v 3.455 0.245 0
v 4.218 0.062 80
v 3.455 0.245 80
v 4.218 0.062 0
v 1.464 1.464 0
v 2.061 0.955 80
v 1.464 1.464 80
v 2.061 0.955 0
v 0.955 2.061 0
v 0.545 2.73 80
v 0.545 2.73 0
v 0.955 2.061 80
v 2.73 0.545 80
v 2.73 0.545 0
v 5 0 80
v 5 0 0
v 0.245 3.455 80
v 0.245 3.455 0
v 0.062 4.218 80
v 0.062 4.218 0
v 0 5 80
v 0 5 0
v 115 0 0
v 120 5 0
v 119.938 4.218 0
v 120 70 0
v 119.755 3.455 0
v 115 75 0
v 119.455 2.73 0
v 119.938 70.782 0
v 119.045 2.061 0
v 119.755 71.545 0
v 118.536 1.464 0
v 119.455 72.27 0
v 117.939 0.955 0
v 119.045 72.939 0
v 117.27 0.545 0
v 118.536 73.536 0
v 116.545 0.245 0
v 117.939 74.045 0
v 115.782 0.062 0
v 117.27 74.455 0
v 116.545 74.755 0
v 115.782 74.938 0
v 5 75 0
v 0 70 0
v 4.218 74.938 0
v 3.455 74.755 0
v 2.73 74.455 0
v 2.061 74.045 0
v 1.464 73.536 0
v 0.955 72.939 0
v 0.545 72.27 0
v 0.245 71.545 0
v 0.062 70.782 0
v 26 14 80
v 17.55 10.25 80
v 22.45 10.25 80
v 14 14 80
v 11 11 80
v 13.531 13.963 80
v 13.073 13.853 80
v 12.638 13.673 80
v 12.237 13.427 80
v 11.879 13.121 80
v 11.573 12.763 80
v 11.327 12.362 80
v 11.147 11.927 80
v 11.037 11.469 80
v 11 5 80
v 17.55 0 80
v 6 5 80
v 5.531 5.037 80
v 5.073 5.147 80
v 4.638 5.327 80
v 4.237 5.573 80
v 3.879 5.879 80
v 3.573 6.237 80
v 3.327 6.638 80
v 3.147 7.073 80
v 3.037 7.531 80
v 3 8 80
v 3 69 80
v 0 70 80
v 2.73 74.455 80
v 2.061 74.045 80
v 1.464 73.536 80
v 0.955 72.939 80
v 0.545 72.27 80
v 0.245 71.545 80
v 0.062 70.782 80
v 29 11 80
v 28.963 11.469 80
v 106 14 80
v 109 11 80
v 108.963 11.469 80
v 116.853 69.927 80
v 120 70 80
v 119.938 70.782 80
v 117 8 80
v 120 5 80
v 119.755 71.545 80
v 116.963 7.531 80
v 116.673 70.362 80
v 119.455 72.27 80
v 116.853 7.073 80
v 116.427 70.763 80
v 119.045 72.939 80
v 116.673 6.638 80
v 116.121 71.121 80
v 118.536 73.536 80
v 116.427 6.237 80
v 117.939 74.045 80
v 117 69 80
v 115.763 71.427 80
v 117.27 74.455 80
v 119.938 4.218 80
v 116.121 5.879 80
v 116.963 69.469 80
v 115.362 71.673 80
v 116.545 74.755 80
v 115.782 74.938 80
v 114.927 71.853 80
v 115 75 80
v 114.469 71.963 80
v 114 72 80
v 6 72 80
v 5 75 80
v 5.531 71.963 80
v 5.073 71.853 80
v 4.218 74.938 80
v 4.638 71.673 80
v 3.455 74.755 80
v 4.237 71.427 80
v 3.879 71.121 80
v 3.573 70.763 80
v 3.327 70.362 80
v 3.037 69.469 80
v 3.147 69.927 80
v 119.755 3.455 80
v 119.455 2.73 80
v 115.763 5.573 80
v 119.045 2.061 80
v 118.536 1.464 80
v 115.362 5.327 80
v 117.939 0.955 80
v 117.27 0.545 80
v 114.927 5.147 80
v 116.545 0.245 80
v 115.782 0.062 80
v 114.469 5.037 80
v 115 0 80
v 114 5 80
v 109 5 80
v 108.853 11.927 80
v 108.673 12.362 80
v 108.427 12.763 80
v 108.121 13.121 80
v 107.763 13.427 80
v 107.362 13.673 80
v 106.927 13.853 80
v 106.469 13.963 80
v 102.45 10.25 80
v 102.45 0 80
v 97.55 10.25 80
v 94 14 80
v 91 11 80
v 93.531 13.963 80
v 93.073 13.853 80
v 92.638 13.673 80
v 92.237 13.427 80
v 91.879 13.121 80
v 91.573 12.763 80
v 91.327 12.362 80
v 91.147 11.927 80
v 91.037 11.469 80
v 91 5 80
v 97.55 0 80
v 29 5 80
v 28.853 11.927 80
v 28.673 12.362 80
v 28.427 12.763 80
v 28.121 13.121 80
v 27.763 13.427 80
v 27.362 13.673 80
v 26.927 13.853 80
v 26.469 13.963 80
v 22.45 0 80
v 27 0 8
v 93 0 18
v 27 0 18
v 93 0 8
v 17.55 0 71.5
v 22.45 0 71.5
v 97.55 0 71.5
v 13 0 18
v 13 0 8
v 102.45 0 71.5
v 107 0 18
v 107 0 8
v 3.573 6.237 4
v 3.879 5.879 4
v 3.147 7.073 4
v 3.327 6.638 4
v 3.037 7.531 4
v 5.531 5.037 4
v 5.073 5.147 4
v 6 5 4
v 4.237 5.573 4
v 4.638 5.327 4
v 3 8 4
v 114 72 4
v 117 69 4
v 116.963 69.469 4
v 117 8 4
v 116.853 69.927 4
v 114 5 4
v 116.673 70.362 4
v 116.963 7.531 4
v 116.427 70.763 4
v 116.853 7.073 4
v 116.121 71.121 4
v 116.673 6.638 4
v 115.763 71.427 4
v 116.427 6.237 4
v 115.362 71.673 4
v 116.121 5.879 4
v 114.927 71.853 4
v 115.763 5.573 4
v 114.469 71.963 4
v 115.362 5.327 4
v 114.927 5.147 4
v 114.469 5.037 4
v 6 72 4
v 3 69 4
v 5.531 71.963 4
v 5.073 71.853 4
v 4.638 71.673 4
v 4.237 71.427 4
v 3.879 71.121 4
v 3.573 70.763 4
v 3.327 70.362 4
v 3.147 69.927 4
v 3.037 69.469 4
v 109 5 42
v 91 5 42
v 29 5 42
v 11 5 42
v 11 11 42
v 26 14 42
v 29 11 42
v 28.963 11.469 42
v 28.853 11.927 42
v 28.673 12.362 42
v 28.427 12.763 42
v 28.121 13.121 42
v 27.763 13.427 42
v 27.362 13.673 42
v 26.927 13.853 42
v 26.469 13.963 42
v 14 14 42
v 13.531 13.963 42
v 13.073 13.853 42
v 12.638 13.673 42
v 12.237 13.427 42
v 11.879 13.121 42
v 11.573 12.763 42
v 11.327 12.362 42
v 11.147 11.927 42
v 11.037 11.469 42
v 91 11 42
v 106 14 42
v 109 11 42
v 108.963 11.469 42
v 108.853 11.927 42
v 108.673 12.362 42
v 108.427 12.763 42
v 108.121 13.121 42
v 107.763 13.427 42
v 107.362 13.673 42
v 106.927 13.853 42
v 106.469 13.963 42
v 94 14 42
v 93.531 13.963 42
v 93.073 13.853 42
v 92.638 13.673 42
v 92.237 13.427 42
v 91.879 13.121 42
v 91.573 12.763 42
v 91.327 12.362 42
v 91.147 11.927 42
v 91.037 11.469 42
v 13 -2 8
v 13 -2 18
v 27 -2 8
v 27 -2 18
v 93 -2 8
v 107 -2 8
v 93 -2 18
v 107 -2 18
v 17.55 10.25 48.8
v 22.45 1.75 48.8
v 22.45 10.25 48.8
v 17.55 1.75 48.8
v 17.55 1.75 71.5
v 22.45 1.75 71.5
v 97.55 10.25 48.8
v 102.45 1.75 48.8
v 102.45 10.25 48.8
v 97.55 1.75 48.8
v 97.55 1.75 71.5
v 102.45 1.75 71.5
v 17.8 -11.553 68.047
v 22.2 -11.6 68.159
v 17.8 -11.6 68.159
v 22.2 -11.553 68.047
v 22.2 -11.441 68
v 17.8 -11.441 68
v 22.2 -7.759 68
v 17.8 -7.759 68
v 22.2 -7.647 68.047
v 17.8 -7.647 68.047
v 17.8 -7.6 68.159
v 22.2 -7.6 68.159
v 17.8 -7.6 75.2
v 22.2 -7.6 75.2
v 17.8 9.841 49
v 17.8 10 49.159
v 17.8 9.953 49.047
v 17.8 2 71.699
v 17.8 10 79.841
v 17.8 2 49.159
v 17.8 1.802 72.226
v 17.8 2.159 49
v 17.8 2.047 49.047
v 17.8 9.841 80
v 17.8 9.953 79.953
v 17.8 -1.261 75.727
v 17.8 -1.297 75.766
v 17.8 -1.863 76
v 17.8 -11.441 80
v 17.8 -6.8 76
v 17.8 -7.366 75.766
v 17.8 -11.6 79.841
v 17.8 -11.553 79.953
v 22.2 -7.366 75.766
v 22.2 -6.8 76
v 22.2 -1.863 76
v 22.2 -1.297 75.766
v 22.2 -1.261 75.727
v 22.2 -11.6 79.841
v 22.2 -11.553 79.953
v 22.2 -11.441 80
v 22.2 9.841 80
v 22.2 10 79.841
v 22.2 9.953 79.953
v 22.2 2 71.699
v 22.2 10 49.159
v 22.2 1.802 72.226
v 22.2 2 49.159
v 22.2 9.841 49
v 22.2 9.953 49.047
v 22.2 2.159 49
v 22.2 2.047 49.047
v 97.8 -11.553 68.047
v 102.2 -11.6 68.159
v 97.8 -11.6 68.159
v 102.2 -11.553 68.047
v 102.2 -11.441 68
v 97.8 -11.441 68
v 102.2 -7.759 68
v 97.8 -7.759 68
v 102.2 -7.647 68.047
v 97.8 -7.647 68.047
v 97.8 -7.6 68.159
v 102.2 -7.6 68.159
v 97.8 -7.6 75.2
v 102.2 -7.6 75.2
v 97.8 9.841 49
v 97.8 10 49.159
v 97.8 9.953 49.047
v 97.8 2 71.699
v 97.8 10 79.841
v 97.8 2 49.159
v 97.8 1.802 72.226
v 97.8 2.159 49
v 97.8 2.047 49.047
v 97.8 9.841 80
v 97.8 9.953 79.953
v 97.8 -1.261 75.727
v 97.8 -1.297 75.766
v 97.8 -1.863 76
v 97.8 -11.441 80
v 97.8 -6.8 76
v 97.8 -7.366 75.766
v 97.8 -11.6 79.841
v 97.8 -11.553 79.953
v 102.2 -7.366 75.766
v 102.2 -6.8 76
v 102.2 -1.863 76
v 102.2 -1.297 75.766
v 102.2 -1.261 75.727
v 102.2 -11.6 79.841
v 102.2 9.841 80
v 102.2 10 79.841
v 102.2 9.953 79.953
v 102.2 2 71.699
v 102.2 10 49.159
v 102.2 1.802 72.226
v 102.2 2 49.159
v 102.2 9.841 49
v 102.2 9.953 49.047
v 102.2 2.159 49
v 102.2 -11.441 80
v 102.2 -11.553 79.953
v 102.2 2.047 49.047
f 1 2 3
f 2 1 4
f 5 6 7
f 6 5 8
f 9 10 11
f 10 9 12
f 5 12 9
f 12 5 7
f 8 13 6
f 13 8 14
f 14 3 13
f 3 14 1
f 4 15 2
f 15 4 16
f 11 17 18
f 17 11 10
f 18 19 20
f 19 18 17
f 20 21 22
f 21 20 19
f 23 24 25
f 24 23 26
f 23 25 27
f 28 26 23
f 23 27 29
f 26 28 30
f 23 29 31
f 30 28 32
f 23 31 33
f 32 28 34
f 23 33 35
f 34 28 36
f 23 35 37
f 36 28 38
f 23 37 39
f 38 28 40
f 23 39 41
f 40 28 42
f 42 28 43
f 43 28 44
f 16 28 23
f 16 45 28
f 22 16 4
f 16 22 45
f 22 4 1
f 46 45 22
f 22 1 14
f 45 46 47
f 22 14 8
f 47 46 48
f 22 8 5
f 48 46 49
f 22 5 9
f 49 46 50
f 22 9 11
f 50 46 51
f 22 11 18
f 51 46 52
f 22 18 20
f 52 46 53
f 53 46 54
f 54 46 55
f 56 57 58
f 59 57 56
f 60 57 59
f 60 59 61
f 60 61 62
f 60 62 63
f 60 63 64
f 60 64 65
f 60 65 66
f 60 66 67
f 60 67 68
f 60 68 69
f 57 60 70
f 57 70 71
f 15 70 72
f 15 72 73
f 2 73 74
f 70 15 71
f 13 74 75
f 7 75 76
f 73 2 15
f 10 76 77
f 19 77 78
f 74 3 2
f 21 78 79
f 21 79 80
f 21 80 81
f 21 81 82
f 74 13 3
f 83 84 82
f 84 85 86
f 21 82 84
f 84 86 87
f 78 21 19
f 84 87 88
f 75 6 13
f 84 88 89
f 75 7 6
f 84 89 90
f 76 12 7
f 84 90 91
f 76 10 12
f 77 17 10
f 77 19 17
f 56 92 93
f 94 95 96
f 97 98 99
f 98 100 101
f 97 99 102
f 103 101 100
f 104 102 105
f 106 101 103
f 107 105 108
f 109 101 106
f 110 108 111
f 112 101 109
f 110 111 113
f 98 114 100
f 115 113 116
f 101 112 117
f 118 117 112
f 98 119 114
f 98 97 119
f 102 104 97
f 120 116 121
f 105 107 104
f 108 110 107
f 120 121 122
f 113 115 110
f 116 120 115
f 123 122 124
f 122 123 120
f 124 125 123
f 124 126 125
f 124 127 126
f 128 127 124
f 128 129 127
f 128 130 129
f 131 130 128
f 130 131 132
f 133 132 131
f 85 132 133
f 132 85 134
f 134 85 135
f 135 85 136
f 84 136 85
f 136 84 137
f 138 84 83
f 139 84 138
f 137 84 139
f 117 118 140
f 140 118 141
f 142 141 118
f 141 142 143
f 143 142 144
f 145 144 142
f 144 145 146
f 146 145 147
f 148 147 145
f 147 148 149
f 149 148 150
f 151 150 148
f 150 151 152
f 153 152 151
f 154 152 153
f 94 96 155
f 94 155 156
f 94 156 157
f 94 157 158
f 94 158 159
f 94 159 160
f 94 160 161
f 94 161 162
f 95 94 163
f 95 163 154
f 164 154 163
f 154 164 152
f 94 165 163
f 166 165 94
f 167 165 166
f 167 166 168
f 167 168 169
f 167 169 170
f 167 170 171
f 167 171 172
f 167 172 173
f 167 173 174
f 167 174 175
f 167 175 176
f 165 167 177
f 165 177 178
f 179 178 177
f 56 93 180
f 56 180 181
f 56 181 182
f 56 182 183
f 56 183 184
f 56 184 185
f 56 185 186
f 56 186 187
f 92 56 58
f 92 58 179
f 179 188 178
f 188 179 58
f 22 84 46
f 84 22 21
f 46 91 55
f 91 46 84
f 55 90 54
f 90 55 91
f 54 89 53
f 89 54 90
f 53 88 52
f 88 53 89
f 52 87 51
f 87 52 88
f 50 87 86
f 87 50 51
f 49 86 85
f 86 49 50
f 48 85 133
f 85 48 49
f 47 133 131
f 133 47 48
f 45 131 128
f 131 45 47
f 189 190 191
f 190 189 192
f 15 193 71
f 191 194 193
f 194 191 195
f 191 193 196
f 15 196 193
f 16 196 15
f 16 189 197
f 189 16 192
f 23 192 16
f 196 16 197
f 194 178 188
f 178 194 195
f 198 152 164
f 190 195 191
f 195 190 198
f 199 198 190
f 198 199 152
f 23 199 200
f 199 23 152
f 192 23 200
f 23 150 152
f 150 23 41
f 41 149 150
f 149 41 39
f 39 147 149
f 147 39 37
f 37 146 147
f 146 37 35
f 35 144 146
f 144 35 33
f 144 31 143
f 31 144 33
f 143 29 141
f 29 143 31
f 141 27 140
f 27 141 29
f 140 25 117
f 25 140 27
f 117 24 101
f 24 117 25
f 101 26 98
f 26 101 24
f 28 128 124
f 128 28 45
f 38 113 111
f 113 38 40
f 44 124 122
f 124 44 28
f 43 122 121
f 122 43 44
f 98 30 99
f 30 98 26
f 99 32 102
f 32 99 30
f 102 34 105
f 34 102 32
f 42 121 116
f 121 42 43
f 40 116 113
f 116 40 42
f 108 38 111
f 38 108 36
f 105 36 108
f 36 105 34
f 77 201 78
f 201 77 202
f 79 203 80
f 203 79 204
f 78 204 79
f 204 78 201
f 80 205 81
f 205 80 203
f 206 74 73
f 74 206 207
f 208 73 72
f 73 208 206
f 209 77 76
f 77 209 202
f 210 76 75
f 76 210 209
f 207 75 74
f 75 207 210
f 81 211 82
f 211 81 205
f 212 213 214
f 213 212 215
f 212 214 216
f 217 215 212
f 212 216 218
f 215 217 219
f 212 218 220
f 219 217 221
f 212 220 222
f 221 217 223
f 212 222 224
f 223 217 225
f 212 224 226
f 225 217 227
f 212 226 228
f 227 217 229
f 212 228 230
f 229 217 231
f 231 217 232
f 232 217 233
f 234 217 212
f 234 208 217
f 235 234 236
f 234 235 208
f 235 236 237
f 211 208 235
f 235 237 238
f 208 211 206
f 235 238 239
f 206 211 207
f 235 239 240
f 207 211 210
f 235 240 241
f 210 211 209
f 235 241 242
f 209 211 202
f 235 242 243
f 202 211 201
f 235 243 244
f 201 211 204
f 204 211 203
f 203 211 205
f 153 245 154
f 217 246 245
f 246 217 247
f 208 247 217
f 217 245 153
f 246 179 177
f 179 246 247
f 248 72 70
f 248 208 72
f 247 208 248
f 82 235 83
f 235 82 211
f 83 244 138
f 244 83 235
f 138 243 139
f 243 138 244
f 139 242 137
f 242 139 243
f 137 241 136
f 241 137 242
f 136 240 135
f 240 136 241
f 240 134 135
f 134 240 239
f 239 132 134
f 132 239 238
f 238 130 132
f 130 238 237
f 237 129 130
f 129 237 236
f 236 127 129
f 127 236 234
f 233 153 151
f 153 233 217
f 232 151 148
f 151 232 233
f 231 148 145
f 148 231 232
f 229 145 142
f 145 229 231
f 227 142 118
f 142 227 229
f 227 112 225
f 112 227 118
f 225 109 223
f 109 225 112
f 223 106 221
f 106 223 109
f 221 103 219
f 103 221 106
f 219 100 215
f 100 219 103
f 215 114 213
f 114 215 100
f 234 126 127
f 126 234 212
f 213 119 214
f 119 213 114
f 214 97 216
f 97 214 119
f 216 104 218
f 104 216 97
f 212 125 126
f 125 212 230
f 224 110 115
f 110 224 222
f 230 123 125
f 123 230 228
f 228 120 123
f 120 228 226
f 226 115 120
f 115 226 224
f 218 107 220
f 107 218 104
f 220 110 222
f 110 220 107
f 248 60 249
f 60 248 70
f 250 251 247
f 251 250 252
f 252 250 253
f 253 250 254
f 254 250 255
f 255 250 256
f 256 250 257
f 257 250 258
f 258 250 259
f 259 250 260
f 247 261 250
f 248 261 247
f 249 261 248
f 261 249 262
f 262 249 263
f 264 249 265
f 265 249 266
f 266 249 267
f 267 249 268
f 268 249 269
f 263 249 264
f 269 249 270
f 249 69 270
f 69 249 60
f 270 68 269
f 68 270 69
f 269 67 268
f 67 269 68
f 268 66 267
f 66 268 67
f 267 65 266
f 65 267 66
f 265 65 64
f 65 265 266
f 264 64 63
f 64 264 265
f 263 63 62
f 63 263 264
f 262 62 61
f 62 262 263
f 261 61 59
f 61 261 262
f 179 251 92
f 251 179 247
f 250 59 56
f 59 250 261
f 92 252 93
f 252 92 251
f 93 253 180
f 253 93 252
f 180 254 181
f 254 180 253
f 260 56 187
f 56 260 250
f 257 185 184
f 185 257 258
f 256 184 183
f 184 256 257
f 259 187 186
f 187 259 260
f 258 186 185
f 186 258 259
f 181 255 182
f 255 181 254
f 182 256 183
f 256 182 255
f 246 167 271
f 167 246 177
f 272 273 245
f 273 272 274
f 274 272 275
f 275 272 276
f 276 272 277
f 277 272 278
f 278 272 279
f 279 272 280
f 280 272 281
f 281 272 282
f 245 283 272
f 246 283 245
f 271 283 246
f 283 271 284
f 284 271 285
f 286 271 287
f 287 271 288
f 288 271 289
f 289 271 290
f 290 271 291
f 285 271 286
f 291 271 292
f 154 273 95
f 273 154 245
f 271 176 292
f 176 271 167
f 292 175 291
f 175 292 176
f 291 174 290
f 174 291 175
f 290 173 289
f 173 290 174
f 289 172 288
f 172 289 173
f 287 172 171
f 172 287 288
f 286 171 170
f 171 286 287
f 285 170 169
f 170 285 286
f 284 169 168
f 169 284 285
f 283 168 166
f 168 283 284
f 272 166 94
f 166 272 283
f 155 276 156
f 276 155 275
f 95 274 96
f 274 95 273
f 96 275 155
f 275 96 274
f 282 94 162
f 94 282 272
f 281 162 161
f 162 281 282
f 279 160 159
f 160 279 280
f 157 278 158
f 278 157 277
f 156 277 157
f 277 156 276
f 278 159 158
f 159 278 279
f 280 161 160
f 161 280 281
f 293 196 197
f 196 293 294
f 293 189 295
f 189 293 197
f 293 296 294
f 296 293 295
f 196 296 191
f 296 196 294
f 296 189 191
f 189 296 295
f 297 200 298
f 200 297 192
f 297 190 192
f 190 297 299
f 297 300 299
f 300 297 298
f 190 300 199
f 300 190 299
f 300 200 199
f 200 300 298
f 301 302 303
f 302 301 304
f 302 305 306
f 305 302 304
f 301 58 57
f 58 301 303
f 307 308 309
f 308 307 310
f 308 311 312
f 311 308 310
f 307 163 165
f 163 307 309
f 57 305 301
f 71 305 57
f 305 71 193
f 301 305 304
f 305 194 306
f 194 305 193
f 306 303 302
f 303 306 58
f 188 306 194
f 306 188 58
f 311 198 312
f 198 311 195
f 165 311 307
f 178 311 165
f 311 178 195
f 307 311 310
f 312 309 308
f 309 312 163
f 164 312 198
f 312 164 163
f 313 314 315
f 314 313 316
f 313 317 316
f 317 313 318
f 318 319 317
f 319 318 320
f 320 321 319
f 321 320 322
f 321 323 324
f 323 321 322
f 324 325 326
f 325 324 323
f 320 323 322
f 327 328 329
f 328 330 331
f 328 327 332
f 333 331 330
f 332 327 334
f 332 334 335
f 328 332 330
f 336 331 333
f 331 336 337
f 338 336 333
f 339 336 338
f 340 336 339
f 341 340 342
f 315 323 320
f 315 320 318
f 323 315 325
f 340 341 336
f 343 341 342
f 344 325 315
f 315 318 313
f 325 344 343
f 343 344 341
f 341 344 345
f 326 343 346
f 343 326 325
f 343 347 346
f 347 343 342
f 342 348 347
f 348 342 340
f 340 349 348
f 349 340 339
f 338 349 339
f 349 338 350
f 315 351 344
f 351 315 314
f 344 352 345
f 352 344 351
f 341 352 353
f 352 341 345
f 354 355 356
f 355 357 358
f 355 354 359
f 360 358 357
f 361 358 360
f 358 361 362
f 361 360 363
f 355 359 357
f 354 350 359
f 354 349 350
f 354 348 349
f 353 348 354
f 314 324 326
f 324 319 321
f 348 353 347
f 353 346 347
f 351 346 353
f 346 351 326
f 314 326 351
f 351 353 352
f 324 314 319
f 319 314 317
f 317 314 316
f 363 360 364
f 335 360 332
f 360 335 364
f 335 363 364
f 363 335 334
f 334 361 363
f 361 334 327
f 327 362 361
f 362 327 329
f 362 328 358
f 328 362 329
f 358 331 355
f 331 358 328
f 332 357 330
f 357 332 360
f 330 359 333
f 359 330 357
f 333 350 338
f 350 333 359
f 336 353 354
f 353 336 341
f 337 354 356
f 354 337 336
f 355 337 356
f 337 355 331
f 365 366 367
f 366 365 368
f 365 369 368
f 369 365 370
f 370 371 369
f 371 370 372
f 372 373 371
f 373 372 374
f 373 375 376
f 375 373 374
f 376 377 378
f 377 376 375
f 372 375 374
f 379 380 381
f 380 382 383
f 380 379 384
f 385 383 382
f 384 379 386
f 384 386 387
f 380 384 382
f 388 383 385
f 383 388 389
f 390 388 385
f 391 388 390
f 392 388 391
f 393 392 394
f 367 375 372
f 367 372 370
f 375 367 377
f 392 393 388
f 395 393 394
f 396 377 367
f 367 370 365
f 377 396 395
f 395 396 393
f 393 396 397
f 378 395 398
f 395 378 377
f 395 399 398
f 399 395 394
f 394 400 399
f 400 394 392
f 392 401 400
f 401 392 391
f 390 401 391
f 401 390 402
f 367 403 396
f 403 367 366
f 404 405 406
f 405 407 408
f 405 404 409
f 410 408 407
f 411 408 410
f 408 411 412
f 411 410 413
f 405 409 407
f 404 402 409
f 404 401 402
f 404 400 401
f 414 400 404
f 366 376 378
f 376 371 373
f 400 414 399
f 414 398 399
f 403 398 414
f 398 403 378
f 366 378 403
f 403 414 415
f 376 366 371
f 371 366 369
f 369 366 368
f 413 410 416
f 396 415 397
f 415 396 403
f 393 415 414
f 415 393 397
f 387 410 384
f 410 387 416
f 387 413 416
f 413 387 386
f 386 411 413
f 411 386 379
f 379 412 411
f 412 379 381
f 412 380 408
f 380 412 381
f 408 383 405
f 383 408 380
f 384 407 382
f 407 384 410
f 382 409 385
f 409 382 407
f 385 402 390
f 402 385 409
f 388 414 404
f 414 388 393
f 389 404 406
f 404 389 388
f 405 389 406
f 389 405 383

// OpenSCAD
// SKADIS hook assembly preview. Editable: skadis-hooks.scad
color([0.18,0.55,0.64]) polyhedron(points=[[5,0,0],[27,0,8],[13,0,8],[3.4549150466918945,0.24471741914749146,0],[4.217827796936035,0.06155829876661301,0],[3.4549150466918945,0.24471741914749146,80],[1.4644660949707031,1.4644660949707031,0],[2.0610737800598145,0.9549150466918945,0],[1.4644660949707031,1.4644660949707031,80],[0.5449673533439636,2.7300474643707275,0],[0.9549150466918945,2.0610737800598145,0],[0.5449673533439636,2.7300474643707275,80],[0.9549150466918945,2.0610737800598145,80],[2.7300474643707275,0.5449673533439636,0],[2.0610737800598145,0.9549150466918945,80],[2.7300474643707275,0.5449673533439636,80],[4.217827796936035,0.06155829876661301,80],[0.24471741914749146,3.4549150466918945,80],[0.24471741914749146,3.4549150466918945,0],[0.06155829876661301,4.217827796936035,80],[0.06155829876661301,4.217827796936035,0],[0,5,80],[0,5,0],[5,0,80],[13,0,18],[27,0,18],[0.9549150466918945,72.93892669677734,0],[1.4644660949707031,73.53553771972656,0],[0.24471741914749146,71.54508209228516,0],[0.06155829876661301,70.78217315673828,0],[0.5449673533439636,72.26995086669922,0],[0,70,0],[2.0610737800598145,74.04508209228516,0],[3.4549150466918945,74.75527954101562,0],[2.7300474643707275,74.45503234863281,0],[4.217827796936035,74.93843841552734,0],[93,0,8],[5,75,0],[115,0,0],[3.3269803524017334,6.638028621673584,80],[3.8786797523498535,5.8786797523498535,80],[4.638028621673584,5.3269805908203125,80],[3.572948932647705,6.236644268035889,80],[3.1468305587768555,7.072948932647705,80],[3.0369350910186768,7.530696392059326,80],[3,8,80],[4.236644268035889,5.572948932647705,80],[5.530696392059326,5.036934852600098,80],[5.072948932647705,5.1468305587768555,80],[6,5,80],[11,4.770642280578613,80],[17.549999237060547,0,71.5],[17.549999237060547,0,80],[17.549999237060547,1.75,80],[17.549999237060547,4.470183372497559,80],[11,5,80],[29,3.9449541568756104,80],[22.450000762939453,1.75,80],[22.450000762939453,0,80],[22.450000762939453,4.245412826538086,80],[0,70,80],[0.9549150466918945,72.93892669677734,80],[1.4644660949707031,73.53553771972656,80],[0.24471741914749146,71.54508209228516,80],[0.06155829876661301,70.78217315673828,80],[0.5449673533439636,72.26995086669922,80],[2.0610737800598145,74.04508209228516,80],[3,69,80],[93,0,18],[22.450000762939453,0,71.5],[97.55000305175781,0,80],[91.87399291992188,1.0608259439468384,80],[91,5,80],[29,5,80],[2.7300474643707275,74.45503234863281,80],[3.4549150466918945,74.75527954101562,80],[4.217827796936035,74.93843841552734,80],[5,75,80],[3.0369350910186768,69.46930694580078,80],[3.1468305587768555,69.92704772949219,80],[3.3269803524017334,70.36196899414062,80],[3.572948932647705,70.76335906982422,80],[3.8786797523498535,71.12132263183594,80],[4.236644268035889,71.42704772949219,80],[4.638028621673584,71.67301940917969,80],[5.072948932647705,71.8531723022461,80],[5.530696392059326,71.96306610107422,80],[6,72,80],[115,75,80],[114,72,80],[107,0,8],[115,0,80],[115.78217315673828,0.06155829876661301,0],[116.54508209228516,0.24471741914749146,0],[115.78217315673828,0.06155829876661301,80],[117.26995086669922,0.5449673533439636,0],[116.54508209228516,0.24471741914749146,80],[117.93892669677734,0.9549150466918945,0],[117.26995086669922,0.5449673533439636,80],[118.53553771972656,1.4644660949707031,0],[117.93892669677734,0.9549150466918945,80],[119.04508209228516,2.0610737800598145,0],[118.53553771972656,1.4644660949707031,80],[119.45503234863281,2.7300474643707275,0],[119.04508209228516,2.0610737800598145,80],[119.75527954101562,3.4549150466918945,0],[119.45503234863281,2.7300474643707275,80],[119.93843841552734,4.217827796936035,0],[119.75527954101562,3.4549150466918945,80],[120,5,0],[119.93843841552734,4.217827796936035,80],[107,0,18],[115,75,0],[115.78217315673828,74.93843841552734,0],[116.54508209228516,74.75527954101562,0],[117.26995086669922,74.45503234863281,0],[117.93892669677734,74.04508209228516,0],[118.53553771972656,73.53553771972656,0],[119.04508209228516,72.93892669677734,0],[119.45503234863281,72.26995086669922,0],[119.75527954101562,71.54508209228516,0],[119.93843841552734,70.78217315673828,0],[120,70,0],[120,5,80],[97.55000305175781,0,71.5],[97.55000305175781,0.8004587292671204,80],[91.57295227050781,5,80],[102.44999694824219,0,71.5],[107.36196899414062,0.35036829113960266,80],[102.44999694824219,0.5756880640983582,80],[102.44999694824219,0,80],[109,5,80],[107.6277084350586,5,80],[114.92704772949219,5.1468305587768555,80],[115.76335906982422,5.572948932647705,80],[116.42704772949219,6.236644268035889,80],[114,5,80],[114.46930694580078,5.036934852600098,80],[115.36196899414062,5.3269805908203125,80],[116.12132263183594,5.8786797523498535,80],[116.67301940917969,6.638028621673584,80],[116.8531723022461,7.072948932647705,80],[116.96306610107422,7.530696392059326,80],[117,8,80],[117.26995086669922,74.45503234863281,80],[117.93892669677734,74.04508209228516,80],[118.53553771972656,73.53553771972656,80],[119.04508209228516,72.93892669677734,80],[119.45503234863281,72.26995086669922,80],[119.75527954101562,71.54508209228516,80],[119.93843841552734,70.78217315673828,80],[115.78217315673828,74.93843841552734,80],[120,70,80],[116.54508209228516,74.75527954101562,80],[117,69,80],[116.12132263183594,71.12132263183594,80],[115.76335906982422,71.42704772949219,80],[114.46930694580078,71.96306610107422,80],[114.92704772949219,71.8531723022461,80],[115.36196899414062,71.67301940917969,80],[116.96306610107422,69.46930694580078,80],[116.8531723022461,69.92704772949219,80],[116.67301940917969,70.36196899414062,80],[116.42704772949219,70.76335906982422,80],[3.572948932647705,6.236644268035889,4],[3.8786797523498535,5.8786797523498535,4],[3.3269803524017334,6.638028621673584,4],[3.1468305587768555,7.072948932647705,4],[3.0369350910186768,7.530696392059326,4],[5.072948932647705,5.1468305587768555,4],[5.530696392059326,5.036934852600098,4],[6,5,4],[4.236644268035889,5.572948932647705,4],[4.638028621673584,5.3269805908203125,4],[3,8,4],[11,5,42],[29,5,42],[3.1468305587768555,69.92704772949219,4],[3.0369350910186768,69.46930694580078,4],[3.3269803524017334,70.36196899414062,4],[3.572948932647705,70.76335906982422,4],[3,69,4],[4.236644268035889,71.42704772949219,4],[3.8786797523498535,71.12132263183594,4],[4.638028621673584,71.67301940917969,4],[5.072948932647705,71.8531723022461,4],[5.530696392059326,71.96306610107422,4],[114,5,4],[6,72,4],[91,5,42],[109,5,42],[114.46930694580078,5.036934852600098,4],[114.92704772949219,5.1468305587768555,4],[115.36196899414062,5.3269805908203125,4],[115.76335906982422,5.572948932647705,4],[116.12132263183594,5.8786797523498535,4],[116.42704772949219,6.236644268035889,4],[116.67301940917969,6.638028621673584,4],[116.8531723022461,7.072948932647705,4],[116.96306610107422,7.530696392059326,4],[117,8,4],[114,72,4],[114.46930694580078,71.96306610107422,4],[114.92704772949219,71.8531723022461,4],[115.36196899414062,71.67301940917969,4],[115.76335906982422,71.42704772949219,4],[116.12132263183594,71.12132263183594,4],[116.42704772949219,70.76335906982422,4],[116.67301940917969,70.36196899414062,4],[116.8531723022461,69.92704772949219,4],[116.96306610107422,69.46930694580078,4],[117,69,4],[11,11,42],[11.036934852600098,11.469303131103516,42],[11.146830558776855,11.927050590515137,42],[11.326980590820312,12.361971855163574,42],[11.572949409484863,12.76335620880127,42],[11.878679275512695,13.121320724487305,42],[12.23664379119873,13.427050590515137,42],[12.638028144836426,13.673019409179688,42],[13.072949409484863,13.853169441223145,42],[13.530696868896484,13.963065147399902,42],[14,14,42],[11.036934852600098,11.469303131103516,80],[11.146830558776855,11.927050590515137,80],[11.326980590820312,12.361971855163574,80],[11.572949409484863,12.76335620880127,80],[11.878679275512695,13.121320724487305,80],[12.23664379119873,13.427050590515137,80],[12.638028144836426,13.673019409179688,80],[13.072949409484863,13.853169441223145,80],[13.530696868896484,13.963065147399902,80],[14,14,80],[29,11,42],[26,14,42],[26.469303131103516,13.963065147399902,42],[26.927051544189453,13.853169441223145,42],[27.763355255126953,13.427050590515137,42],[28.121320724487305,13.121320724487305,42],[27.361970901489258,13.673019409179688,42],[28.963064193725586,11.469303131103516,42],[28.85317039489746,11.927050590515137,42],[28.673019409179688,12.361971855163574,42],[28.427051544189453,12.76335620880127,42],[26,14,80],[29,11,80],[28.963064193725586,11.469303131103516,80],[28.85317039489746,11.927050590515137,80],[27.763355255126953,13.427050590515137,80],[28.121320724487305,13.121320724487305,80],[26.469303131103516,13.963065147399902,80],[26.927051544189453,13.853169441223145,80],[27.361970901489258,13.673019409179688,80],[28.673019409179688,12.361971855163574,80],[28.427051544189453,12.76335620880127,80],[17.549999237060547,10.25,80],[11,11,80],[22.450000762939453,10.25,80],[109,11,42],[91,11,42],[91.03693389892578,11.469303131103516,42],[91.1468276977539,11.927050590515137,42],[91.32698059082031,12.361971855163574,42],[91.57295227050781,12.76335620880127,42],[91.87867736816406,13.121320724487305,42],[92.23664093017578,13.427050590515137,42],[92.63803100585938,13.673019409179688,42],[93.07295227050781,13.853169441223145,42],[93.53069305419922,13.963065147399902,42],[94,14,42],[106,14,42],[106.46930694580078,13.963065147399902,42],[108.96306610107422,11.469303131103516,42],[108.8531723022461,11.927050590515137,42],[108.67301940917969,12.361971855163574,42],[106.92704772949219,13.853169441223145,42],[107.36196899414062,13.673019409179688,42],[107.76335906982422,13.427050590515137,42],[108.12132263183594,13.121320724487305,42],[108.42704772949219,12.76335620880127,42],[91.03693389892578,11.469303131103516,80],[91.1468276977539,11.927050590515137,80],[91.32698059082031,12.361971855163574,80],[91.57295227050781,12.76335620880127,80],[91.87867736816406,13.121320724487305,80],[92.23664093017578,13.427050590515137,80],[92.63803100585938,13.673019409179688,80],[93.07295227050781,13.853169441223145,80],[93.53069305419922,13.963065147399902,80],[94,14,80],[106,14,80],[109,11,80],[108.96306610107422,11.469303131103516,80],[108.8531723022461,11.927050590515137,80],[106.46930694580078,13.963065147399902,80],[106.92704772949219,13.853169441223145,80],[107.76335906982422,13.427050590515137,80],[108.67301940917969,12.361971855163574,80],[108.42704772949219,12.76335620880127,80],[108.12132263183594,13.121320724487305,80],[107.36196899414062,13.673019409179688,80],[97.55000305175781,1.75,80],[91,11,80],[97.55000305175781,10.25,80],[102.44999694824219,1.75,80],[102.44999694824219,10.25,80],[13,-2,8],[13,-2,18],[27,-2,8],[27,-2,18],[93,-2,8],[107,-2,8],[93,-2,18],[107,-2,18],[17.549999237060547,1.75,48.79999923706055],[22.450000762939453,1.75,48.79999923706055],[17.549999237060547,10.25,48.79999923706055],[22.450000762939453,10.25,48.79999923706055],[17.549999237060547,1.75,71.5],[22.450000762939453,1.75,71.5],[97.55000305175781,1.75,48.79999923706055],[102.44999694824219,1.75,48.79999923706055],[97.55000305175781,10.25,48.79999923706055],[102.44999694824219,10.25,48.79999923706055],[97.55000305175781,1.75,71.5],[102.44999694824219,1.75,71.5]],faces=[[2,1,0],[5,4,3],[8,7,6],[11,10,9],[10,12,6],[14,13,7],[13,15,3],[16,0,4],[18,17,9],[20,19,18],[22,21,20],[23,2,0],[23,24,2],[23,25,24],[26,10,6],[7,27,6],[28,18,9],[29,20,18],[10,30,9],[31,22,20],[13,32,7],[4,33,3],[34,13,3],[0,35,4],[1,36,0],[25,36,1],[23,36,25],[38,37,0],[15,5,3],[8,14,7],[11,12,10],[12,8,6],[14,15,13],[5,16,4],[16,23,0],[17,11,9],[19,17,18],[21,19,20],[15,39,5],[40,16,5],[41,23,16],[42,40,5],[39,42,5],[43,39,15],[44,43,15],[45,44,15],[40,46,16],[46,41,16],[48,47,23],[47,49,23],[41,48,23],[49,50,23],[52,51,23],[53,52,23],[54,53,23],[55,50,49],[50,54,23],[58,57,56],[57,59,56],[60,21,22],[12,61,8],[62,14,8],[17,63,11],[19,64,17],[65,12,11],[21,60,19],[66,15,14],[67,45,15],[51,69,68],[51,68,23],[70,69,58],[71,58,56],[73,72,56],[29,31,20],[28,29,18],[30,28,9],[26,30,10],[27,26,6],[32,27,7],[34,32,13],[33,34,3],[35,33,4],[37,35,0],[31,60,22],[29,64,31],[28,63,29],[30,65,28],[26,61,30],[27,62,26],[32,66,27],[34,74,32],[33,75,34],[35,76,33],[37,77,35],[60,64,19],[74,67,15],[64,63,17],[63,65,11],[65,61,12],[61,62,8],[62,66,14],[66,74,15],[64,60,31],[63,64,29],[65,63,28],[61,65,30],[62,61,26],[66,62,27],[74,66,32],[75,74,34],[76,75,33],[77,76,35],[74,78,67],[74,79,78],[74,80,79],[74,81,80],[75,82,81],[74,75,81],[83,82,75],[76,84,83],[76,85,84],[76,83,75],[77,86,85],[77,87,86],[76,77,85],[88,77,37],[77,89,87],[36,90,0],[90,38,0],[68,36,23],[91,38,90],[91,92,38],[94,93,92],[96,95,93],[98,97,95],[100,99,97],[102,101,99],[104,103,101],[106,105,103],[108,107,105],[110,109,107],[91,111,68],[111,91,90],[92,112,38],[93,113,92],[95,114,93],[97,115,95],[99,116,97],[101,117,99],[103,118,101],[105,119,103],[107,120,105],[109,121,107],[123,122,109],[69,124,68],[70,124,69],[125,58,71],[125,70,58],[126,71,56],[72,126,56],[124,127,68],[127,91,68],[91,94,92],[94,96,93],[96,98,95],[98,100,97],[100,102,99],[102,104,101],[104,106,103],[106,108,105],[108,110,107],[110,123,109],[130,129,128],[127,130,91],[91,130,128],[131,91,128],[132,131,128],[133,94,91],[134,96,94],[135,98,96],[136,91,131],[136,137,91],[137,133,91],[133,138,94],[138,134,94],[134,139,96],[139,135,96],[135,140,98],[140,141,98],[141,142,98],[142,143,98],[144,100,98],[145,102,100],[146,104,102],[147,106,104],[148,108,106],[149,110,108],[150,123,110],[143,144,98],[38,112,37],[112,88,37],[113,112,92],[114,113,93],[115,114,95],[116,115,97],[117,116,99],[118,117,101],[122,121,109],[120,119,105],[121,120,107],[119,118,103],[113,151,112],[152,121,122],[150,120,121],[149,119,120],[148,118,119],[114,153,113],[115,144,114],[145,115,116],[147,117,118],[117,146,116],[88,89,77],[152,122,123],[154,144,143],[144,145,100],[145,146,102],[146,147,104],[150,152,123],[148,149,108],[149,150,110],[147,148,106],[151,88,112],[153,151,113],[152,150,121],[150,149,120],[149,148,119],[144,153,114],[145,144,115],[147,146,117],[148,147,118],[146,145,116],[156,151,155],[88,157,89],[88,158,157],[88,159,158],[151,156,159],[151,153,155],[88,151,159],[160,144,154],[161,144,160],[163,153,162],[162,144,161],[153,163,155],[153,144,162],[165,42,164],[43,167,166],[39,166,164],[44,168,167],[170,48,169],[171,47,170],[40,165,172],[46,172,173],[41,173,169],[45,174,168],[176,175,171],[167,177,166],[168,178,167],[166,179,164],[180,165,164],[174,181,168],[172,182,173],[165,183,172],[173,184,169],[185,170,169],[186,171,170],[187,176,171],[188,187,171],[175,55,171],[42,39,164],[39,43,166],[43,44,167],[48,41,169],[47,48,170],[49,47,171],[46,40,172],[41,46,173],[40,42,165],[55,49,171],[44,45,168],[45,67,174],[72,73,176],[181,178,168],[178,177,167],[177,179,166],[179,180,164],[180,183,165],[183,182,172],[182,184,173],[184,185,169],[185,186,170],[186,188,171],[67,181,174],[78,178,181],[79,177,178],[80,179,177],[81,180,179],[82,183,180],[83,182,183],[84,184,182],[85,185,184],[86,186,185],[87,188,186],[67,78,181],[78,79,178],[79,80,177],[80,81,179],[81,82,180],[82,83,183],[83,84,182],[84,85,184],[85,86,185],[86,87,186],[87,89,188],[187,189,176],[190,189,187],[191,136,187],[192,137,191],[193,133,192],[194,138,193],[195,134,194],[196,139,195],[197,135,196],[198,140,197],[199,141,198],[200,142,199],[201,191,187],[202,192,191],[203,193,192],[204,194,193],[205,195,194],[206,196,195],[207,197,196],[208,198,197],[209,199,198],[210,200,199],[211,143,200],[189,72,176],[136,190,187],[137,136,191],[133,137,192],[138,133,193],[134,138,194],[139,134,195],[135,139,196],[140,135,197],[141,140,198],[142,141,199],[143,142,200],[136,131,190],[201,187,188],[89,201,188],[201,202,191],[202,203,192],[203,204,193],[204,205,194],[205,206,195],[210,211,200],[209,210,199],[208,209,198],[206,207,196],[207,208,197],[210,154,211],[209,160,210],[208,161,209],[157,202,201],[205,155,206],[158,203,202],[159,204,203],[156,205,204],[207,162,208],[163,207,206],[211,154,143],[160,154,210],[161,160,209],[89,157,201],[155,163,206],[156,155,205],[157,158,202],[158,159,203],[159,156,204],[163,162,207],[162,161,208],[212,55,175],[213,212,175],[214,213,175],[215,214,175],[216,215,175],[217,216,175],[218,217,175],[219,218,175],[220,219,175],[221,220,175],[222,221,175],[213,223,212],[214,224,213],[215,225,214],[216,226,215],[217,227,216],[218,228,217],[219,229,218],[220,230,219],[221,231,220],[222,232,221],[176,233,175],[234,222,175],[235,234,175],[236,235,175],[238,237,175],[239,236,175],[237,239,175],[233,240,175],[240,241,175],[241,242,175],[242,243,175],[243,238,175],[234,244,222],[245,233,176],[245,240,233],[246,241,240],[247,242,241],[248,239,237],[249,237,238],[235,250,234],[236,251,235],[239,252,236],[253,243,242],[243,254,238],[55,255,50],[256,55,212],[223,256,212],[224,223,213],[225,224,214],[226,225,215],[227,226,216],[228,227,217],[229,228,218],[230,229,219],[231,230,220],[232,231,221],[256,255,55],[223,255,256],[224,255,223],[225,255,224],[226,255,225],[227,255,226],[228,255,227],[73,245,176],[255,54,50],[59,257,56],[246,73,56],[244,232,222],[245,246,240],[246,247,241],[247,253,242],[250,244,234],[248,252,239],[249,248,237],[251,250,235],[252,251,236],[253,254,243],[254,249,238],[257,255,228],[229,257,228],[230,257,229],[231,257,230],[232,257,231],[244,257,232],[257,244,56],[247,246,56],[246,245,73],[253,247,56],[249,254,56],[254,253,56],[244,250,56],[250,251,56],[251,252,56],[252,248,56],[248,249,56],[190,258,189],[259,72,189],[260,259,189],[261,260,189],[262,261,189],[263,262,189],[264,263,189],[265,264,189],[266,265,189],[267,266,189],[268,267,189],[269,268,189],[270,269,189],[271,270,189],[258,272,189],[272,273,189],[273,274,189],[275,271,189],[276,275,189],[277,276,189],[279,278,189],[278,277,189],[274,279,189],[260,280,259],[261,281,260],[262,282,261],[263,283,262],[264,284,263],[265,285,264],[266,286,265],[267,287,266],[268,288,267],[269,289,268],[270,290,269],[291,258,190],[291,272,258],[292,273,272],[273,293,274],[271,294,270],[275,295,271],[296,276,277],[297,279,274],[298,278,279],[278,299,277],[276,300,275],[301,125,71],[126,283,71],[302,126,72],[303,301,71],[129,304,128],[304,305,128],[302,72,259],[280,302,259],[281,280,260],[282,281,261],[283,282,262],[284,283,263],[285,284,264],[286,285,265],[287,286,266],[288,287,267],[289,288,268],[290,289,269],[302,280,126],[280,281,126],[281,282,126],[283,303,71],[282,283,126],[284,303,283],[285,303,284],[286,303,285],[287,303,286],[288,303,287],[289,303,288],[305,303,289],[290,305,289],[131,291,190],[300,132,128],[293,297,274],[291,292,272],[292,293,273],[294,290,270],[295,294,271],[296,300,276],[298,299,278],[297,298,279],[299,296,277],[300,295,275],[305,290,128],[290,294,128],[296,131,132],[294,295,128],[295,300,128],[300,296,132],[298,297,131],[299,298,131],[296,299,131],[292,291,131],[293,292,131],[297,293,131],[2,307,306],[24,307,2],[1,2,306],[308,1,306],[307,308,306],[309,308,307],[24,309,307],[25,309,24],[25,1,308],[309,25,308],[90,36,310],[311,90,310],[36,312,310],[68,312,36],[312,311,310],[313,311,312],[68,313,312],[111,313,68],[111,90,311],[313,111,311],[316,315,314],[316,317,315],[315,318,314],[255,316,314],[317,319,315],[257,317,316],[319,318,315],[318,255,314],[317,57,319],[59,57,317],[53,54,318],[54,255,318],[257,59,317],[255,257,316],[322,321,320],[322,323,321],[321,324,320],[303,322,320],[323,325,321],[305,323,322],[325,324,321],[324,303,320],[323,304,325],[305,304,323],[301,303,324],[303,305,322],[51,52,318],[319,51,318],[69,51,319],[57,69,319],[52,53,318],[69,57,58],[325,124,324],[127,124,325],[124,70,324],[304,127,325],[70,125,324],[301,324,125],[127,129,130],[127,304,129]]);
color([0.95,0.65,0.22]) polyhedron(points=[[17.799999237060547,-11.600000381469727,68.15912628173828],[17.799999237060547,-7.599999904632568,75.19999694824219],[17.799999237060547,-11.553391456604004,68.0466079711914],[17.799999237060547,-11.44087028503418,68],[17.799999237060547,-7.759130001068115,68],[17.799999237060547,-7.599999904632568,68.15912628173828],[17.799999237060547,-7.646607875823975,68.0466079711914],[22.200000762939453,-11.600000381469727,68.15912628173828],[22.200000762939453,-11.553391456604004,68.0466079711914],[22.200000762939453,-11.44087028503418,68],[22.200000762939453,-7.759130001068115,68],[22.200000762939453,-7.646607875823975,68.0466079711914],[22.200000762939453,-7.599999904632568,68.15912628173828],[17.799999237060547,-11.600000381469727,79.84087371826172],[17.799999237060547,-11.553391456604004,79.9533920288086],[17.799999237060547,-7.36568546295166,75.76568603515625],[17.799999237060547,-11.44087028503418,80],[17.799999237060547,-6.800000190734863,76],[17.799999237060547,-1.863014578819275,76],[22.200000762939453,-11.600000381469727,79.84087371826172],[22.200000762939453,-11.553391456604004,79.9533920288086],[22.200000762939453,-11.44087028503418,80],[22.200000762939453,-7.599999904632568,75.19999694824219],[22.200000762939453,-7.36568546295166,75.76568603515625],[17.799999237060547,9.840869903564453,80],[22.200000762939453,-6.800000190734863,76],[22.200000762939453,-1.863014578819275,76],[17.799999237060547,-1.2973291873931885,75.76568603515625],[22.200000762939453,-1.2973291873931885,75.76568603515625],[17.799999237060547,-1.2609531879425049,75.726806640625],[22.200000762939453,9.840869903564453,80],[22.200000762939453,-1.2609531879425049,75.726806640625],[17.799999237060547,2,49.15913009643555],[17.799999237060547,2.1591298580169678,49],[17.799999237060547,2.0466079711914062,49.046607971191406],[17.799999237060547,2,71.69940948486328],[22.200000762939453,2,49.15913009643555],[22.200000762939453,2.0466079711914062,49.046607971191406],[22.200000762939453,2,71.69940948486328],[17.799999237060547,9.840869903564453,49],[17.799999237060547,9.953392028808594,49.046607971191406],[17.799999237060547,10,49.15913009643555],[22.200000762939453,2.1591298580169678,49],[22.200000762939453,9.840869903564453,49],[22.200000762939453,9.953392028808594,49.046607971191406],[22.200000762939453,10,49.15913009643555],[17.799999237060547,10,79.84087371826172],[22.200000762939453,1.8020613193511963,72.2262191772461],[17.799999237060547,1.8020613193511963,72.2262191772461],[17.799999237060547,9.953392028808594,79.9533920288086],[22.200000762939453,10,79.84087371826172],[22.200000762939453,9.953392028808594,79.9533920288086]],faces=[[2,1,0],[3,1,2],[4,1,3],[6,5,4],[5,1,4],[2,0,7],[3,2,8],[4,3,9],[6,4,10],[5,6,11],[1,5,12],[0,1,13],[13,15,14],[14,15,16],[1,15,13],[15,17,16],[17,18,16],[0,13,19],[13,14,20],[14,16,21],[15,1,22],[17,15,23],[16,18,24],[18,17,25],[27,18,26],[29,27,28],[2,7,8],[3,8,9],[4,9,10],[0,19,7],[6,10,11],[5,11,12],[22,8,7],[22,9,8],[22,10,9],[12,11,10],[22,12,10],[13,20,19],[14,21,20],[1,12,22],[15,22,23],[17,23,25],[22,7,19],[23,19,20],[23,20,21],[23,22,19],[25,23,21],[26,25,21],[18,25,26],[16,30,21],[27,26,28],[29,28,31],[26,21,30],[34,33,32],[32,33,35],[34,32,36],[33,34,37],[32,35,38],[33,39,35],[39,40,35],[40,41,35],[39,33,42],[40,39,43],[41,40,44],[46,41,45],[34,36,37],[33,37,42],[32,38,36],[42,37,36],[42,36,38],[39,42,43],[40,43,44],[41,44,45],[43,42,38],[44,43,38],[45,44,38],[35,48,47],[48,46,29],[27,24,18],[29,24,27],[48,29,31],[16,24,30],[41,46,35],[35,46,48],[46,49,29],[49,24,29],[49,46,50],[24,49,51],[35,47,38],[48,31,47],[50,47,31],[30,28,26],[30,31,28],[46,45,50],[50,45,38],[24,51,30],[49,50,51],[50,38,47],[51,50,31],[30,51,31]]);
color([0.95,0.65,0.22]) polyhedron(points=[[97.80000305175781,-11.600000381469727,68.15912628173828],[97.80000305175781,-7.599999904632568,75.19999694824219],[97.80000305175781,-11.553391456604004,68.0466079711914],[97.80000305175781,-11.44087028503418,68],[97.80000305175781,-7.759130001068115,68],[97.80000305175781,-7.599999904632568,68.15912628173828],[97.80000305175781,-7.646607875823975,68.0466079711914],[102.19999694824219,-11.600000381469727,68.15912628173828],[102.19999694824219,-11.553391456604004,68.0466079711914],[102.19999694824219,-11.44087028503418,68],[102.19999694824219,-7.759130001068115,68],[102.19999694824219,-7.646607875823975,68.0466079711914],[102.19999694824219,-7.599999904632568,68.15912628173828],[97.80000305175781,-11.600000381469727,79.84087371826172],[97.80000305175781,-11.553391456604004,79.9533920288086],[97.80000305175781,-7.36568546295166,75.76568603515625],[97.80000305175781,-11.44087028503418,80],[97.80000305175781,-6.800000190734863,76],[97.80000305175781,-1.863014578819275,76],[102.19999694824219,-11.600000381469727,79.84087371826172],[102.19999694824219,-11.553391456604004,79.9533920288086],[102.19999694824219,-11.44087028503418,80],[102.19999694824219,-7.599999904632568,75.19999694824219],[102.19999694824219,-7.36568546295166,75.76568603515625],[97.80000305175781,9.840869903564453,80],[102.19999694824219,-6.800000190734863,76],[102.19999694824219,-1.863014578819275,76],[97.80000305175781,-1.2973291873931885,75.76568603515625],[102.19999694824219,-1.2973291873931885,75.76568603515625],[97.80000305175781,-1.2609531879425049,75.726806640625],[102.19999694824219,9.840869903564453,80],[102.19999694824219,-1.2609531879425049,75.726806640625],[97.80000305175781,2,49.15913009643555],[97.80000305175781,2.1591298580169678,49],[97.80000305175781,2.0466079711914062,49.046607971191406],[97.80000305175781,2,71.69940948486328],[102.19999694824219,2,49.15913009643555],[102.19999694824219,2.0466079711914062,49.046607971191406],[102.19999694824219,2,71.69940948486328],[97.80000305175781,9.840869903564453,49],[97.80000305175781,9.953392028808594,49.046607971191406],[97.80000305175781,10,49.15913009643555],[102.19999694824219,2.1591298580169678,49],[102.19999694824219,9.840869903564453,49],[102.19999694824219,9.953392028808594,49.046607971191406],[102.19999694824219,10,49.15913009643555],[97.80000305175781,10,79.84087371826172],[102.19999694824219,1.8020613193511963,72.2262191772461],[97.80000305175781,1.8020613193511963,72.2262191772461],[97.80000305175781,9.953392028808594,79.9533920288086],[102.19999694824219,10,79.84087371826172],[102.19999694824219,9.953392028808594,79.9533920288086]],faces=[[2,1,0],[3,1,2],[4,1,3],[6,5,4],[5,1,4],[2,0,7],[3,2,8],[4,3,9],[6,4,10],[5,6,11],[1,5,12],[0,1,13],[13,15,14],[14,15,16],[1,15,13],[15,17,16],[17,18,16],[0,13,19],[13,14,20],[14,16,21],[15,1,22],[17,15,23],[16,18,24],[18,17,25],[27,18,26],[29,27,28],[2,7,8],[3,8,9],[4,9,10],[0,19,7],[6,10,11],[5,11,12],[22,8,7],[22,9,8],[22,10,9],[12,11,10],[22,12,10],[13,20,19],[14,21,20],[1,12,22],[15,22,23],[17,23,25],[22,7,19],[23,19,20],[23,20,21],[23,22,19],[25,23,21],[26,25,21],[18,25,26],[16,30,21],[27,26,28],[29,28,31],[26,21,30],[34,33,32],[32,33,35],[34,32,36],[33,34,37],[32,35,38],[33,39,35],[39,40,35],[40,41,35],[39,33,42],[40,39,43],[41,40,44],[46,41,45],[34,36,37],[33,37,42],[32,38,36],[42,37,36],[42,36,38],[39,42,43],[40,43,44],[41,44,45],[43,42,38],[44,43,38],[45,44,38],[35,48,47],[48,46,29],[27,24,18],[29,24,27],[48,29,31],[16,24,30],[41,46,35],[35,46,48],[46,49,29],[49,24,29],[49,46,50],[24,49,51],[35,47,38],[48,31,47],[50,47,31],[30,28,26],[30,31,28],[46,45,50],[50,45,38],[24,51,30],[49,50,51],[50,38,47],[51,50,31],[30,51,31]]);
